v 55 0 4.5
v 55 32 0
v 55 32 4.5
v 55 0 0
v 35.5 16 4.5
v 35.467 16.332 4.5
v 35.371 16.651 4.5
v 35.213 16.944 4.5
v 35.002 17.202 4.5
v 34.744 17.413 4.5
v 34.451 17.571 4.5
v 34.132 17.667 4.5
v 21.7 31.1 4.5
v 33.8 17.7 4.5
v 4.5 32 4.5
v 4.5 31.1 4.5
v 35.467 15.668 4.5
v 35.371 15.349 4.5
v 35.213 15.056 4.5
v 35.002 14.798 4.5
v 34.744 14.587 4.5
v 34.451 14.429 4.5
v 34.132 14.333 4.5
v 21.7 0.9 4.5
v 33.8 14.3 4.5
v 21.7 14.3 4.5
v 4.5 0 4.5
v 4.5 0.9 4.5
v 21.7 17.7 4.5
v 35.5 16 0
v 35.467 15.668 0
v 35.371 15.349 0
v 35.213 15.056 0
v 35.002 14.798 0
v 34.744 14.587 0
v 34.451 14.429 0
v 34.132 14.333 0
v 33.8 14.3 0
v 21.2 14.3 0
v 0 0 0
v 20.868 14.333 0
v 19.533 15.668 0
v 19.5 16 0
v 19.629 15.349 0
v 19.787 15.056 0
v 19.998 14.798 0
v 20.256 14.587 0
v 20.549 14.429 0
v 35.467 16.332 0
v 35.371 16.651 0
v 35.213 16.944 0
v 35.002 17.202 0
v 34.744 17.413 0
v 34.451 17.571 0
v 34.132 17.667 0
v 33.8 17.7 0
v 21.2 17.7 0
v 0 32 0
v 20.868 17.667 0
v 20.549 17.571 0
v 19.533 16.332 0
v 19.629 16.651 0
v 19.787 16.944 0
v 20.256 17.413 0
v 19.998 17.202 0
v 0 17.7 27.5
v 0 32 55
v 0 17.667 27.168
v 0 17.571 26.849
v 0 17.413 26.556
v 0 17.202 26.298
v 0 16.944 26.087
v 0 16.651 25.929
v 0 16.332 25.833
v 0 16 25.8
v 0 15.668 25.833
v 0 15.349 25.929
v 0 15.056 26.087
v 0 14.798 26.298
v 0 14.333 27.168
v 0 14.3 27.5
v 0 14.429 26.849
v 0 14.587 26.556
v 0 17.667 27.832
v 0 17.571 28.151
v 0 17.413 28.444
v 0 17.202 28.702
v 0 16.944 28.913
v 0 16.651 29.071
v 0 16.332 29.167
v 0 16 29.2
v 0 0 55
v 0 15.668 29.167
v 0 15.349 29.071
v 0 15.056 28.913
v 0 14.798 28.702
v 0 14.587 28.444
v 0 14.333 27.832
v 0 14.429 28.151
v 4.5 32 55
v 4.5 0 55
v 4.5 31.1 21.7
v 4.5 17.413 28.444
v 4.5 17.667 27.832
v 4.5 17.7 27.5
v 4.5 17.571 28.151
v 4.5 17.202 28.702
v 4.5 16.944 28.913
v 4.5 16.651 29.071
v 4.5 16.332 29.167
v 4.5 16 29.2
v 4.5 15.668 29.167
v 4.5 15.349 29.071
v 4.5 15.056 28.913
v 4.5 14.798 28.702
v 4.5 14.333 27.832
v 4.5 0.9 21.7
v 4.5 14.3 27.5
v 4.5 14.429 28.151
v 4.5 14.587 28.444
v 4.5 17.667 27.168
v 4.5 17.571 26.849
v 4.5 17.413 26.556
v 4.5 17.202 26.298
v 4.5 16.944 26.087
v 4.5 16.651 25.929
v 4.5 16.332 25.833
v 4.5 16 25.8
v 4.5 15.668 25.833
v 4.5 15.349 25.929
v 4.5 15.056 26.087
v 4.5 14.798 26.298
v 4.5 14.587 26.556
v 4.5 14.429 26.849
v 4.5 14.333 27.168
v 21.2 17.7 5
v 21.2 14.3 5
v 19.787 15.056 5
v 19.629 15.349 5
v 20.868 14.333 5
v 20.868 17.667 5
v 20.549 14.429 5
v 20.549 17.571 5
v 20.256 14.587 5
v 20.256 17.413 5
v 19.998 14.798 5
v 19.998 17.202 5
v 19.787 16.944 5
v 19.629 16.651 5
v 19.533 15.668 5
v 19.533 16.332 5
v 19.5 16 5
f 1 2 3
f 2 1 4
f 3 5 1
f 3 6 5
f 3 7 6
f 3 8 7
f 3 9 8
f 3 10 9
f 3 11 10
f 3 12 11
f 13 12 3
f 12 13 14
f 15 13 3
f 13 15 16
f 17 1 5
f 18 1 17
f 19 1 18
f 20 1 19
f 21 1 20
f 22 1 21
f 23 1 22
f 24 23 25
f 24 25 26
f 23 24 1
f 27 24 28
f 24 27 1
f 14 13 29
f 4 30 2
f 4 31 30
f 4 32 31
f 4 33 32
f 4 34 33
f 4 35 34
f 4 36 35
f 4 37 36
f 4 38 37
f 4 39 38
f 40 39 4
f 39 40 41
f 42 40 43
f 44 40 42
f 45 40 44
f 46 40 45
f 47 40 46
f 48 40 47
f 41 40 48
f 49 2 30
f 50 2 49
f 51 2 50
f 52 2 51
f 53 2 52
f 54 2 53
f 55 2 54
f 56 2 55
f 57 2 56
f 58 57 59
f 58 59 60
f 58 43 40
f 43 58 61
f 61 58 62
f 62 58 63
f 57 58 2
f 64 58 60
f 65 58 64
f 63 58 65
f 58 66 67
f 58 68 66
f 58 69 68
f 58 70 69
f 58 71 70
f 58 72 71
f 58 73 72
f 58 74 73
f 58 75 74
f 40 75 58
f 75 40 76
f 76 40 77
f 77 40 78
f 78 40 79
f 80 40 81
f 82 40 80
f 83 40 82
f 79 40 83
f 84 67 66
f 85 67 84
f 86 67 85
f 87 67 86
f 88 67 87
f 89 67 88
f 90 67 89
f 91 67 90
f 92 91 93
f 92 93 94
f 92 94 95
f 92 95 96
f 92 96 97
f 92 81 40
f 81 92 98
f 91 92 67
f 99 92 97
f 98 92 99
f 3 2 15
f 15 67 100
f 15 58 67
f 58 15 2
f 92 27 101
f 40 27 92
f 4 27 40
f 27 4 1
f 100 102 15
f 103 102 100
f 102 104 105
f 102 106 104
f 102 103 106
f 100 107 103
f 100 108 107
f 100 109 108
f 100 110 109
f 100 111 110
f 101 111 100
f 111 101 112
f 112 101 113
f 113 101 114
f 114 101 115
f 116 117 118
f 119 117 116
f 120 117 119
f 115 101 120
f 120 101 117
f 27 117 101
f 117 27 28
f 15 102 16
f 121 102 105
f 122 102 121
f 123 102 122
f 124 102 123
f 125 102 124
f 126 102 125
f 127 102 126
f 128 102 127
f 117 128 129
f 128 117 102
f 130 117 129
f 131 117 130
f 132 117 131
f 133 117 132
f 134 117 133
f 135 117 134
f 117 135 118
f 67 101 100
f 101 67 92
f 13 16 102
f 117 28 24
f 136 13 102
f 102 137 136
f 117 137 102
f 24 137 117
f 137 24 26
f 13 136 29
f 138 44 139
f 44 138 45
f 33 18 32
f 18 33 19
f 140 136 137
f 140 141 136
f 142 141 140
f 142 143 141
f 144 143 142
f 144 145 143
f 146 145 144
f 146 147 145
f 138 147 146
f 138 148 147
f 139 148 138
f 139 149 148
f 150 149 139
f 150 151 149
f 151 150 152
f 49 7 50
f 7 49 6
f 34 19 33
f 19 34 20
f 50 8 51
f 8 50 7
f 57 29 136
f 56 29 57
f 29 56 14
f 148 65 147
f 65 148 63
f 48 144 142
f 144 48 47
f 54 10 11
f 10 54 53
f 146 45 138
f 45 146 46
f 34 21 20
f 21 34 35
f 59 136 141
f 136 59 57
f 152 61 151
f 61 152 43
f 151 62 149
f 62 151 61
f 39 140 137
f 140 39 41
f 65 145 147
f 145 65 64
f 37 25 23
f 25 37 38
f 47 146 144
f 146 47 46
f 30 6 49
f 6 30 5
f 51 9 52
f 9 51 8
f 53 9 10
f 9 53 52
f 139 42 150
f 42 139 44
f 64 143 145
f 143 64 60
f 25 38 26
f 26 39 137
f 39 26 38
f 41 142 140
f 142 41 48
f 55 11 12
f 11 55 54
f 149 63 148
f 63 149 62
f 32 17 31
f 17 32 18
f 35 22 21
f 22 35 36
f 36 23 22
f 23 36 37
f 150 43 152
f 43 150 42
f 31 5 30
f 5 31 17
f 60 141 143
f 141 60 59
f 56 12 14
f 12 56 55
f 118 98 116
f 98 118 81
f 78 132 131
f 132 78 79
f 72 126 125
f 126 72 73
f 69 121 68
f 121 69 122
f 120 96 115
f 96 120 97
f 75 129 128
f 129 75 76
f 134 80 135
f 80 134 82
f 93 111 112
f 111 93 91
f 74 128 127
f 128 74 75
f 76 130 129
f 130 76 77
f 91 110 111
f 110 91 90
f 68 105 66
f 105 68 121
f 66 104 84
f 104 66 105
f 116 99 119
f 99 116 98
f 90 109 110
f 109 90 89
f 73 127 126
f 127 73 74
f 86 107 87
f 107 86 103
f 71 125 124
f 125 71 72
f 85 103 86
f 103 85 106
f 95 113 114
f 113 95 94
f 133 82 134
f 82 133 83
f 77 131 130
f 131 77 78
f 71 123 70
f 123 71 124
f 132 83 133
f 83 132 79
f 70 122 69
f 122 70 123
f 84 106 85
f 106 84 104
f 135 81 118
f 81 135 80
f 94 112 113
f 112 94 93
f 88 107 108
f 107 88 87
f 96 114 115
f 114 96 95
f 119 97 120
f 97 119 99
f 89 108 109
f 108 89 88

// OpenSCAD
$fn = 32;

// ----------------------------------------------------------------------
// L-bracket: 55 x 32 x 55 mm
// ----------------------------------------------------------------------

// --- parameters (mm) ---
leg_a = 55;               // horizontal leg, X
leg_b = 55;               // vertical leg, Z
depth = 32;               // bracket depth, Y
thick = 4.5;              // plate thickness
hole_d = 3.4;             // clearance for M3
slot_l = 16;              // adjustment slot length
rib_leg = 25.3;           // gusset leg
rib_sink = 0.9;           // gusset overlap into the plates

module hole_z(px, py) {
  translate([px, py, -0.5]) cylinder(h = thick + 1, d = hole_d);
}
module hole_x(pz, py) {
  translate([-0.5, py, pz]) rotate([0, 90, 0]) cylinder(h = thick + 1, d = hole_d);
}
module adjust_slot(px, py) {
  hull() {
    translate([px - (slot_l - hole_d) / 2, py, -0.5]) cylinder(h = thick + 1, d = hole_d);
    translate([px + (slot_l - hole_d) / 2, py, -0.5]) cylinder(h = thick + 1, d = hole_d);
  }
}
module gusset() {
  translate([0, depth - rib_sink, 0])
    rotate([90, 0, 0])
      linear_extrude(height = depth - 2 * rib_sink)
        polygon(points = [[rib_sink, rib_sink], [rib_leg, rib_sink], [rib_sink, rib_leg]]);
}

difference() {
  union() {
    /* horizontal leg */
    cube([leg_a, depth, thick]);
    /* vertical leg, overlapping the corner block */
    cube([thick, depth, leg_b]);
    gusset();
  }
  adjust_slot(27.5, 16);
  hole_x(27.5, 16);
}
